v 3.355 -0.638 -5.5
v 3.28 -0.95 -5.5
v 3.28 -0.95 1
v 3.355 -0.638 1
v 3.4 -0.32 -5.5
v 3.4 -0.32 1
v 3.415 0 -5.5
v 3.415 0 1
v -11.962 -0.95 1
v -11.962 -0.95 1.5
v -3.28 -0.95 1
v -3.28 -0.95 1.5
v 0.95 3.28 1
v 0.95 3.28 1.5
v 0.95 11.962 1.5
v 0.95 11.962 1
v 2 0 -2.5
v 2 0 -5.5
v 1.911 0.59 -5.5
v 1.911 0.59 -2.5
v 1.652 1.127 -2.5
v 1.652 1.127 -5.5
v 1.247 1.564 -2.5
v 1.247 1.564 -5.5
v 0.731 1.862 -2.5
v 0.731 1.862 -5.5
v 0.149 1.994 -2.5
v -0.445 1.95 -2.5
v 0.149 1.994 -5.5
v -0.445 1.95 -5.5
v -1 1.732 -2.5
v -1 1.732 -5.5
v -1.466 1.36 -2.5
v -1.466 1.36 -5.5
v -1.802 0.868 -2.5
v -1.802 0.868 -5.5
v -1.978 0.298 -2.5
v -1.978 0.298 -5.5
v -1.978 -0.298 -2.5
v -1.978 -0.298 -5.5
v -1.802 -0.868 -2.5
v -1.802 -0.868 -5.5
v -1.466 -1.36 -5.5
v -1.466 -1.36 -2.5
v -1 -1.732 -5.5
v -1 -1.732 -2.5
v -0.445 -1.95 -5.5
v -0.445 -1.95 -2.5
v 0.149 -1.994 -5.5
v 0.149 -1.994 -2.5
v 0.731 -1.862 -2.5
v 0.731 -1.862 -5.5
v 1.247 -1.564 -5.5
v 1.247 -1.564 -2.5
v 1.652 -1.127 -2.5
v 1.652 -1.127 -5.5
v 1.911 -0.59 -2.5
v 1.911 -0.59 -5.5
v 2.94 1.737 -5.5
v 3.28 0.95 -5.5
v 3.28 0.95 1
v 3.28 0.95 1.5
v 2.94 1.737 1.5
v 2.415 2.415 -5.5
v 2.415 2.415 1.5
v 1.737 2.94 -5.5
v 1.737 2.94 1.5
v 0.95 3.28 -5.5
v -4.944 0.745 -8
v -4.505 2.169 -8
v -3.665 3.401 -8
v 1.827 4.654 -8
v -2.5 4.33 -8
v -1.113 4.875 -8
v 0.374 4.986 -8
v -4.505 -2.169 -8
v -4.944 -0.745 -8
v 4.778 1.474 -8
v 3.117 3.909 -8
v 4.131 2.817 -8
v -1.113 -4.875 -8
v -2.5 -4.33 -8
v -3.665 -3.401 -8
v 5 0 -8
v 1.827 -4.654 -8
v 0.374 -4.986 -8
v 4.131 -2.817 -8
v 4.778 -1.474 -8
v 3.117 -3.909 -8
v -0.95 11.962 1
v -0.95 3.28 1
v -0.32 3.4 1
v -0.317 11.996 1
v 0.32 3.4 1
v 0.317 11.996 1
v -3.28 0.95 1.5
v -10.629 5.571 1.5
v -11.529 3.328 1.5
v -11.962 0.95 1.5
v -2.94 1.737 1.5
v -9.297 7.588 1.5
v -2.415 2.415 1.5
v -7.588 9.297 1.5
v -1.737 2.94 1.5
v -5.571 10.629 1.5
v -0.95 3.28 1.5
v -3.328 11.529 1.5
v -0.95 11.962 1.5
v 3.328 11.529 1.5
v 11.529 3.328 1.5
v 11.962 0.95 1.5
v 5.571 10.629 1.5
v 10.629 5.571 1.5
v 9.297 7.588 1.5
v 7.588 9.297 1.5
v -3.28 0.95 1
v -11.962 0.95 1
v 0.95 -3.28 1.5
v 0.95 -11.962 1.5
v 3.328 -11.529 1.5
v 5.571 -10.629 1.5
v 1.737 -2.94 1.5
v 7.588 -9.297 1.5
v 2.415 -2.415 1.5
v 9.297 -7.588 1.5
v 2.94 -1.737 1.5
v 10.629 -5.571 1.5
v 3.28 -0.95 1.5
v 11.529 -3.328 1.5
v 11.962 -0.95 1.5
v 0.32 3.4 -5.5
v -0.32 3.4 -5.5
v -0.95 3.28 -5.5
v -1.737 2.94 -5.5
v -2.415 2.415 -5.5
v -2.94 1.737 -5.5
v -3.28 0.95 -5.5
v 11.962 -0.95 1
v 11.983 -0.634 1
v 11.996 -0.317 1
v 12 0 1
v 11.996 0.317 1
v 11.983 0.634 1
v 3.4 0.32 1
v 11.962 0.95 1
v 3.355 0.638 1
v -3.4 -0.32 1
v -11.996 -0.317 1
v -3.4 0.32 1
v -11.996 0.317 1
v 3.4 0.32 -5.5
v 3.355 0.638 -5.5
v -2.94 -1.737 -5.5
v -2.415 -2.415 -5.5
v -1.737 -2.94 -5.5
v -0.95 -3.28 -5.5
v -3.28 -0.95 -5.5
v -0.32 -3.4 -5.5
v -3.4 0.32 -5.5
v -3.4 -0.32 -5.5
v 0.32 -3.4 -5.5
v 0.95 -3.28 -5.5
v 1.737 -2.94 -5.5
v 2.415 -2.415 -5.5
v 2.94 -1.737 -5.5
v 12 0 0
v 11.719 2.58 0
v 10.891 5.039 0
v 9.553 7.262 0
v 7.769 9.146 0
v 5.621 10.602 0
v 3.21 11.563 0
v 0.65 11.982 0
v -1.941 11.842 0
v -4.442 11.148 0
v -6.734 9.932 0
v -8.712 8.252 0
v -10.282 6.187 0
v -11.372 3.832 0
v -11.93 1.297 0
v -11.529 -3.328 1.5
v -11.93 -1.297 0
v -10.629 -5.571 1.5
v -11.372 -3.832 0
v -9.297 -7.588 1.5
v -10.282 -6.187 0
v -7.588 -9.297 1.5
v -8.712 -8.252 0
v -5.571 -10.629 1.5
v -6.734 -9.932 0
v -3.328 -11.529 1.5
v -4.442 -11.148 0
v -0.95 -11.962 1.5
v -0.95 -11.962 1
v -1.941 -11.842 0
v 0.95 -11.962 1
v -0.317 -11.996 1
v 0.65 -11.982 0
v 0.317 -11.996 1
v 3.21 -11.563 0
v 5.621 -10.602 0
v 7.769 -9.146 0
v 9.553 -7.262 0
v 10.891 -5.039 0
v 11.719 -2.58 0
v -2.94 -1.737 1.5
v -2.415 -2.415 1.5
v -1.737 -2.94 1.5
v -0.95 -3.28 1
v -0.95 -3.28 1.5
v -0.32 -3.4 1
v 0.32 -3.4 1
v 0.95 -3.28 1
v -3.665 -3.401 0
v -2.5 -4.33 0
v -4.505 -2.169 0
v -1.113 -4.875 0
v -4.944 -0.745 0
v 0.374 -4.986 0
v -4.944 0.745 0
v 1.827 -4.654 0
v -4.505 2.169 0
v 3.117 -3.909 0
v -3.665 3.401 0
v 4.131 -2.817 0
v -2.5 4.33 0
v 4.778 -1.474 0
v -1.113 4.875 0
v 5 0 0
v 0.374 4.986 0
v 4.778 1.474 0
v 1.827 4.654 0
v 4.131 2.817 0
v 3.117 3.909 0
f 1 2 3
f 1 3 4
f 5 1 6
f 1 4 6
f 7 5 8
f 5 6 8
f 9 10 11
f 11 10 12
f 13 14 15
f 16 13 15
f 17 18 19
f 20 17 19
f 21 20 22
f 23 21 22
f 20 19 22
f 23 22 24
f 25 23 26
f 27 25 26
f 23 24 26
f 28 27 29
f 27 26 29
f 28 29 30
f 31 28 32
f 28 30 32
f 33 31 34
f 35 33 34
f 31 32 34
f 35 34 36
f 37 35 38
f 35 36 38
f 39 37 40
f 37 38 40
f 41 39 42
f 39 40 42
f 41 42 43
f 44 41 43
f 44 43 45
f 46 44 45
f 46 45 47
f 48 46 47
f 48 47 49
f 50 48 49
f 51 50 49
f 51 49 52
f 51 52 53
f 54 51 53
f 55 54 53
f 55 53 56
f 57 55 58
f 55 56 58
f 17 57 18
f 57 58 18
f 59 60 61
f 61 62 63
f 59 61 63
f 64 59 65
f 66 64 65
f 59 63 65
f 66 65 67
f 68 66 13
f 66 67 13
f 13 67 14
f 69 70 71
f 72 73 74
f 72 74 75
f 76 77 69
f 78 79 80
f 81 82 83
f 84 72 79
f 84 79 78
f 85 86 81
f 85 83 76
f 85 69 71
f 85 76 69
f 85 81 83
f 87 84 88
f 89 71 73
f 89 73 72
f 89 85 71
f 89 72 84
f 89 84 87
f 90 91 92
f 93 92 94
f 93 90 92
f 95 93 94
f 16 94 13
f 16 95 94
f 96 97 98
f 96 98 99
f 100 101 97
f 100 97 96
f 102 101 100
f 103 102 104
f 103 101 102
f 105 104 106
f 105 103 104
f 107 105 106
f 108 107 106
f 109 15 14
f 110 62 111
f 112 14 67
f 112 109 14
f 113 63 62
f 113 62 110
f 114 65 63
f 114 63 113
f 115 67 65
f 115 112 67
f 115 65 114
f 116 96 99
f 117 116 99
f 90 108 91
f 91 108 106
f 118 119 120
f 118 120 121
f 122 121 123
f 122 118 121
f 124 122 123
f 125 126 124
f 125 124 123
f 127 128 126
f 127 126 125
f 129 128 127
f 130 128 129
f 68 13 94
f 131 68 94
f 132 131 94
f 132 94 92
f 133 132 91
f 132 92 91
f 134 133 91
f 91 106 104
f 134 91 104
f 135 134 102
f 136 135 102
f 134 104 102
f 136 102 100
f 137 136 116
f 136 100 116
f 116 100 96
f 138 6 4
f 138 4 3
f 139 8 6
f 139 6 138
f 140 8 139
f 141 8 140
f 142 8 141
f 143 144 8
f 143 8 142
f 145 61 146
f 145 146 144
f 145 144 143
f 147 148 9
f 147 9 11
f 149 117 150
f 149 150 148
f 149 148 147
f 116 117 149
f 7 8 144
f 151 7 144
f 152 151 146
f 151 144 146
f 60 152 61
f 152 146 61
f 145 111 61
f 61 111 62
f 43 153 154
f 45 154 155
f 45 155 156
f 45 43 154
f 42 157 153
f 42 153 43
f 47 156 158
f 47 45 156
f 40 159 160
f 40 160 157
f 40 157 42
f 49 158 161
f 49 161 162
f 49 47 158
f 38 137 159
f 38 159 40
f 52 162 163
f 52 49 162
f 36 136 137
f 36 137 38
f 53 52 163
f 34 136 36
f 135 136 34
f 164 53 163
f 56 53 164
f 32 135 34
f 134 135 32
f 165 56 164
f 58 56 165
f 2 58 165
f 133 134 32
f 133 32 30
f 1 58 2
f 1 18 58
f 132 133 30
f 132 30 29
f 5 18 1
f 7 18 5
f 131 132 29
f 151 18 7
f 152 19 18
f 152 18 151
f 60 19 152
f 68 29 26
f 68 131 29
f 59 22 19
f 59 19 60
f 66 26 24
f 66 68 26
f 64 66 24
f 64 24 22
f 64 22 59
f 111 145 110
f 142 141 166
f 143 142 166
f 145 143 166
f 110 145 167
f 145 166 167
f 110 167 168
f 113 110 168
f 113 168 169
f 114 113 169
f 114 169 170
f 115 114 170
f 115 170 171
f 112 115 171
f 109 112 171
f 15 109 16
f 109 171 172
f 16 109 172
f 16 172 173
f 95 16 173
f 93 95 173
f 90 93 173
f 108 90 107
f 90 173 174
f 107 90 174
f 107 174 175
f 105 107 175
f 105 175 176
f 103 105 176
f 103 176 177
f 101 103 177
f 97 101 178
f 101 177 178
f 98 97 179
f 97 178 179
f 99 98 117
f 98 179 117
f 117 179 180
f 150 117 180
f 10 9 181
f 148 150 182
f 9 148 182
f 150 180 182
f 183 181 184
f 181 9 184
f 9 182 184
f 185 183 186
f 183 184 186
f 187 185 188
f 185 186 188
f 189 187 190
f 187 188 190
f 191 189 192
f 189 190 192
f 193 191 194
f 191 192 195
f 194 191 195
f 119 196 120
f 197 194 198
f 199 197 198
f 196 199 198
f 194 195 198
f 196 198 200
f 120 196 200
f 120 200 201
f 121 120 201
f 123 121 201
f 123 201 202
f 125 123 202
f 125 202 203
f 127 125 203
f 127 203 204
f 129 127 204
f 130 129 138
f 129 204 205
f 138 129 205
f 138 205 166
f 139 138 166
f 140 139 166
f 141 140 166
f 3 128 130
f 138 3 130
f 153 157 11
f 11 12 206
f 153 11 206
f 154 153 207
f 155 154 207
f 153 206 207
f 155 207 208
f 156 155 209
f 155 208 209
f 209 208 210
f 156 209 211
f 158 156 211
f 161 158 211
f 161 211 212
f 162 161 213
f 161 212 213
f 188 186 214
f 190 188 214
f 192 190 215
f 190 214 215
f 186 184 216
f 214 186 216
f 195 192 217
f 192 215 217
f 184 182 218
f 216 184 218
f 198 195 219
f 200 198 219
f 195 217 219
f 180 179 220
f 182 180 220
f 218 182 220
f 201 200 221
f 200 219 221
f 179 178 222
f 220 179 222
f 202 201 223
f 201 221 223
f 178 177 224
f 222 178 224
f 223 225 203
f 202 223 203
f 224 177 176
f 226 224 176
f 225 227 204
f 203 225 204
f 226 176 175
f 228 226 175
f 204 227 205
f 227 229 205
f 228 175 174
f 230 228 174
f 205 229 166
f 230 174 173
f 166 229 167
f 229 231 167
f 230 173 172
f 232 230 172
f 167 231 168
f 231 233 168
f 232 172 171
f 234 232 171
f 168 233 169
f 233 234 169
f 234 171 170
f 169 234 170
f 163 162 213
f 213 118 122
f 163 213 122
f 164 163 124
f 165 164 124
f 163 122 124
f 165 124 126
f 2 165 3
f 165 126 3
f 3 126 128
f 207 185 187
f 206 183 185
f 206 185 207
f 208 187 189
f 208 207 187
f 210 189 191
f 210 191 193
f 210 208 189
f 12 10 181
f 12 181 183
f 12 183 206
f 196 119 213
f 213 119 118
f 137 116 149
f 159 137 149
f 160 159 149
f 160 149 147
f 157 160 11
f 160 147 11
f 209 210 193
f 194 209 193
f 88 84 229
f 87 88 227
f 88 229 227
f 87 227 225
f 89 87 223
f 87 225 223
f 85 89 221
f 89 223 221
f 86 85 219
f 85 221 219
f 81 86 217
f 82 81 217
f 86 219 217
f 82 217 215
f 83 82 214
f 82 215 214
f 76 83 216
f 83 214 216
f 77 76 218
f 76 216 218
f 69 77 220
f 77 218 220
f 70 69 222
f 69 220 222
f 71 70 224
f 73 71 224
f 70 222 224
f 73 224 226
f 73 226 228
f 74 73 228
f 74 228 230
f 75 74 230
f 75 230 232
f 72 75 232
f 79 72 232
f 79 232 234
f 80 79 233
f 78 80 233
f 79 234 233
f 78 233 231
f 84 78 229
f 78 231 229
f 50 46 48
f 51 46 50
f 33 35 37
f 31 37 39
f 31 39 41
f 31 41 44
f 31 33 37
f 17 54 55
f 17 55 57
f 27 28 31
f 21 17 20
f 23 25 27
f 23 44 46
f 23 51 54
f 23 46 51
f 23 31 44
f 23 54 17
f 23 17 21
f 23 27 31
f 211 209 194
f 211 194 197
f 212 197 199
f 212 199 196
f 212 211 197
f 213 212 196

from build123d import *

# Parameters (mm, degrees)
F0_R     = 12
F1_DEPTH = 1.5
F2_R     = 5
F3_DEPTH = 8
F5_DEPTH = 0.5
F6_DEPTH = 7
F7_R     = 2
F8_DEPTH = 3


with BuildPart() as f1:
    # F0 (on Top) → F1 (new body)
    with BuildSketch(Plane.XY):
        Circle(F0_R)
    extrude(amount=F1_DEPTH)

    # F2 (on face) → F3 (join)
    with BuildSketch(Plane(origin=(0, 0, 0), x_dir=(1, 0, 0), z_dir=(0, 0, -1))):
        Circle(F2_R)
    extrude(amount=F3_DEPTH)

    # F4 (on face) → F5 (cut)
    with BuildSketch(Plane.XY.offset(1.5)):
        with BuildLine():
            ThreePointArc((-0.95, 3.2802019755), (0, 3.415), (0.95, 3.2802019755))
            Line((0.95, 3.2802019755), (0.95, 11.9623367282))
            ThreePointArc((0.95, 11.9623367282), (0, 12), (-0.95, 11.9623367282))
            Line((-0.95, 11.9623367282), (-0.95, 3.2802019755))
        make_face()
        with BuildLine():
            ThreePointArc((-3.2802019755, -0.95), (-3.415, 0), (-3.2802019755, 0.95))
            Line((-3.2802019755, 0.95), (-11.9623367282, 0.95))
            ThreePointArc((-11.9623367282, 0.95), (-12, 0), (-11.9623367282, -0.95))
            Line((-11.9623367282, -0.95), (-3.2802019755, -0.95))
        make_face()
        with BuildLine():
            Line((0.95, -11.9623367282), (0.95, -3.2802019755))
            ThreePointArc((0.95, -3.2802019755), (0, -3.415), (-0.95, -3.2802019755))
            Line((-0.95, -3.2802019755), (-0.95, -11.9623367282))
            ThreePointArc((-0.95, -11.9623367282), (0, -12), (0.95, -11.9623367282))
        make_face()
        with BuildLine():
            ThreePointArc((3.2802019755, 0.95), (3.3811325578, 0.4797578836), (3.415, 0))
            ThreePointArc((3.415, 0), (3.3811325578, -0.4797578836), (3.2802019755, -0.95))
            Line((3.2802019755, -0.95), (11.9623367282, -0.95))
            ThreePointArc((11.9623367282, -0.95), (11.9905804851, -0.4753731487), (12, 0))
            ThreePointArc((12, 0), (11.9905804851, 0.4753731487), (11.9623367282, 0.95))
            Line((11.9623367282, 0.95), (3.2802019755, 0.95))
        make_face()
    extrude(amount=-F5_DEPTH, mode=Mode.SUBTRACT)

    # F4 (on face) → F6 (cut)
    with BuildSketch(Plane.XY.offset(1.5)):
        with BuildLine():
            ThreePointArc((3.2802019755, -0.95), (3.3811325578, -0.4797578836), (3.415, 0))
            ThreePointArc((3.415, 0), (3.3811325578, 0.4797578836), (3.2802019755, 0.95))
            ThreePointArc((3.2802019755, 0.95), (2.4147696578, 2.4147696578), (0.95, 3.2802019755))
            ThreePointArc((0.95, 3.2802019755), (0, 3.415), (-0.95, 3.2802019755))
            ThreePointArc((-0.95, 3.2802019755), (-2.4147696578, 2.4147696578), (-3.2802019755, 0.95))
            ThreePointArc((-3.2802019755, 0.95), (-3.415, 0), (-3.2802019755, -0.95))
            ThreePointArc((-3.2802019755, -0.95), (-2.4147696578, -2.4147696578), (-0.95, -3.2802019755))
            ThreePointArc((-0.95, -3.2802019755), (0, -3.415), (0.95, -3.2802019755))
            ThreePointArc((0.95, -3.2802019755), (2.4147696578, -2.4147696578), (3.2802019755, -0.95))
        make_face()
    extrude(amount=-F6_DEPTH, mode=Mode.SUBTRACT)

    # F7 (on face) → F8 (join)
    with BuildSketch(Plane.XY.offset(-5.5)):
        Circle(F7_R)
    extrude(amount=F8_DEPTH)


solid = f1.part
